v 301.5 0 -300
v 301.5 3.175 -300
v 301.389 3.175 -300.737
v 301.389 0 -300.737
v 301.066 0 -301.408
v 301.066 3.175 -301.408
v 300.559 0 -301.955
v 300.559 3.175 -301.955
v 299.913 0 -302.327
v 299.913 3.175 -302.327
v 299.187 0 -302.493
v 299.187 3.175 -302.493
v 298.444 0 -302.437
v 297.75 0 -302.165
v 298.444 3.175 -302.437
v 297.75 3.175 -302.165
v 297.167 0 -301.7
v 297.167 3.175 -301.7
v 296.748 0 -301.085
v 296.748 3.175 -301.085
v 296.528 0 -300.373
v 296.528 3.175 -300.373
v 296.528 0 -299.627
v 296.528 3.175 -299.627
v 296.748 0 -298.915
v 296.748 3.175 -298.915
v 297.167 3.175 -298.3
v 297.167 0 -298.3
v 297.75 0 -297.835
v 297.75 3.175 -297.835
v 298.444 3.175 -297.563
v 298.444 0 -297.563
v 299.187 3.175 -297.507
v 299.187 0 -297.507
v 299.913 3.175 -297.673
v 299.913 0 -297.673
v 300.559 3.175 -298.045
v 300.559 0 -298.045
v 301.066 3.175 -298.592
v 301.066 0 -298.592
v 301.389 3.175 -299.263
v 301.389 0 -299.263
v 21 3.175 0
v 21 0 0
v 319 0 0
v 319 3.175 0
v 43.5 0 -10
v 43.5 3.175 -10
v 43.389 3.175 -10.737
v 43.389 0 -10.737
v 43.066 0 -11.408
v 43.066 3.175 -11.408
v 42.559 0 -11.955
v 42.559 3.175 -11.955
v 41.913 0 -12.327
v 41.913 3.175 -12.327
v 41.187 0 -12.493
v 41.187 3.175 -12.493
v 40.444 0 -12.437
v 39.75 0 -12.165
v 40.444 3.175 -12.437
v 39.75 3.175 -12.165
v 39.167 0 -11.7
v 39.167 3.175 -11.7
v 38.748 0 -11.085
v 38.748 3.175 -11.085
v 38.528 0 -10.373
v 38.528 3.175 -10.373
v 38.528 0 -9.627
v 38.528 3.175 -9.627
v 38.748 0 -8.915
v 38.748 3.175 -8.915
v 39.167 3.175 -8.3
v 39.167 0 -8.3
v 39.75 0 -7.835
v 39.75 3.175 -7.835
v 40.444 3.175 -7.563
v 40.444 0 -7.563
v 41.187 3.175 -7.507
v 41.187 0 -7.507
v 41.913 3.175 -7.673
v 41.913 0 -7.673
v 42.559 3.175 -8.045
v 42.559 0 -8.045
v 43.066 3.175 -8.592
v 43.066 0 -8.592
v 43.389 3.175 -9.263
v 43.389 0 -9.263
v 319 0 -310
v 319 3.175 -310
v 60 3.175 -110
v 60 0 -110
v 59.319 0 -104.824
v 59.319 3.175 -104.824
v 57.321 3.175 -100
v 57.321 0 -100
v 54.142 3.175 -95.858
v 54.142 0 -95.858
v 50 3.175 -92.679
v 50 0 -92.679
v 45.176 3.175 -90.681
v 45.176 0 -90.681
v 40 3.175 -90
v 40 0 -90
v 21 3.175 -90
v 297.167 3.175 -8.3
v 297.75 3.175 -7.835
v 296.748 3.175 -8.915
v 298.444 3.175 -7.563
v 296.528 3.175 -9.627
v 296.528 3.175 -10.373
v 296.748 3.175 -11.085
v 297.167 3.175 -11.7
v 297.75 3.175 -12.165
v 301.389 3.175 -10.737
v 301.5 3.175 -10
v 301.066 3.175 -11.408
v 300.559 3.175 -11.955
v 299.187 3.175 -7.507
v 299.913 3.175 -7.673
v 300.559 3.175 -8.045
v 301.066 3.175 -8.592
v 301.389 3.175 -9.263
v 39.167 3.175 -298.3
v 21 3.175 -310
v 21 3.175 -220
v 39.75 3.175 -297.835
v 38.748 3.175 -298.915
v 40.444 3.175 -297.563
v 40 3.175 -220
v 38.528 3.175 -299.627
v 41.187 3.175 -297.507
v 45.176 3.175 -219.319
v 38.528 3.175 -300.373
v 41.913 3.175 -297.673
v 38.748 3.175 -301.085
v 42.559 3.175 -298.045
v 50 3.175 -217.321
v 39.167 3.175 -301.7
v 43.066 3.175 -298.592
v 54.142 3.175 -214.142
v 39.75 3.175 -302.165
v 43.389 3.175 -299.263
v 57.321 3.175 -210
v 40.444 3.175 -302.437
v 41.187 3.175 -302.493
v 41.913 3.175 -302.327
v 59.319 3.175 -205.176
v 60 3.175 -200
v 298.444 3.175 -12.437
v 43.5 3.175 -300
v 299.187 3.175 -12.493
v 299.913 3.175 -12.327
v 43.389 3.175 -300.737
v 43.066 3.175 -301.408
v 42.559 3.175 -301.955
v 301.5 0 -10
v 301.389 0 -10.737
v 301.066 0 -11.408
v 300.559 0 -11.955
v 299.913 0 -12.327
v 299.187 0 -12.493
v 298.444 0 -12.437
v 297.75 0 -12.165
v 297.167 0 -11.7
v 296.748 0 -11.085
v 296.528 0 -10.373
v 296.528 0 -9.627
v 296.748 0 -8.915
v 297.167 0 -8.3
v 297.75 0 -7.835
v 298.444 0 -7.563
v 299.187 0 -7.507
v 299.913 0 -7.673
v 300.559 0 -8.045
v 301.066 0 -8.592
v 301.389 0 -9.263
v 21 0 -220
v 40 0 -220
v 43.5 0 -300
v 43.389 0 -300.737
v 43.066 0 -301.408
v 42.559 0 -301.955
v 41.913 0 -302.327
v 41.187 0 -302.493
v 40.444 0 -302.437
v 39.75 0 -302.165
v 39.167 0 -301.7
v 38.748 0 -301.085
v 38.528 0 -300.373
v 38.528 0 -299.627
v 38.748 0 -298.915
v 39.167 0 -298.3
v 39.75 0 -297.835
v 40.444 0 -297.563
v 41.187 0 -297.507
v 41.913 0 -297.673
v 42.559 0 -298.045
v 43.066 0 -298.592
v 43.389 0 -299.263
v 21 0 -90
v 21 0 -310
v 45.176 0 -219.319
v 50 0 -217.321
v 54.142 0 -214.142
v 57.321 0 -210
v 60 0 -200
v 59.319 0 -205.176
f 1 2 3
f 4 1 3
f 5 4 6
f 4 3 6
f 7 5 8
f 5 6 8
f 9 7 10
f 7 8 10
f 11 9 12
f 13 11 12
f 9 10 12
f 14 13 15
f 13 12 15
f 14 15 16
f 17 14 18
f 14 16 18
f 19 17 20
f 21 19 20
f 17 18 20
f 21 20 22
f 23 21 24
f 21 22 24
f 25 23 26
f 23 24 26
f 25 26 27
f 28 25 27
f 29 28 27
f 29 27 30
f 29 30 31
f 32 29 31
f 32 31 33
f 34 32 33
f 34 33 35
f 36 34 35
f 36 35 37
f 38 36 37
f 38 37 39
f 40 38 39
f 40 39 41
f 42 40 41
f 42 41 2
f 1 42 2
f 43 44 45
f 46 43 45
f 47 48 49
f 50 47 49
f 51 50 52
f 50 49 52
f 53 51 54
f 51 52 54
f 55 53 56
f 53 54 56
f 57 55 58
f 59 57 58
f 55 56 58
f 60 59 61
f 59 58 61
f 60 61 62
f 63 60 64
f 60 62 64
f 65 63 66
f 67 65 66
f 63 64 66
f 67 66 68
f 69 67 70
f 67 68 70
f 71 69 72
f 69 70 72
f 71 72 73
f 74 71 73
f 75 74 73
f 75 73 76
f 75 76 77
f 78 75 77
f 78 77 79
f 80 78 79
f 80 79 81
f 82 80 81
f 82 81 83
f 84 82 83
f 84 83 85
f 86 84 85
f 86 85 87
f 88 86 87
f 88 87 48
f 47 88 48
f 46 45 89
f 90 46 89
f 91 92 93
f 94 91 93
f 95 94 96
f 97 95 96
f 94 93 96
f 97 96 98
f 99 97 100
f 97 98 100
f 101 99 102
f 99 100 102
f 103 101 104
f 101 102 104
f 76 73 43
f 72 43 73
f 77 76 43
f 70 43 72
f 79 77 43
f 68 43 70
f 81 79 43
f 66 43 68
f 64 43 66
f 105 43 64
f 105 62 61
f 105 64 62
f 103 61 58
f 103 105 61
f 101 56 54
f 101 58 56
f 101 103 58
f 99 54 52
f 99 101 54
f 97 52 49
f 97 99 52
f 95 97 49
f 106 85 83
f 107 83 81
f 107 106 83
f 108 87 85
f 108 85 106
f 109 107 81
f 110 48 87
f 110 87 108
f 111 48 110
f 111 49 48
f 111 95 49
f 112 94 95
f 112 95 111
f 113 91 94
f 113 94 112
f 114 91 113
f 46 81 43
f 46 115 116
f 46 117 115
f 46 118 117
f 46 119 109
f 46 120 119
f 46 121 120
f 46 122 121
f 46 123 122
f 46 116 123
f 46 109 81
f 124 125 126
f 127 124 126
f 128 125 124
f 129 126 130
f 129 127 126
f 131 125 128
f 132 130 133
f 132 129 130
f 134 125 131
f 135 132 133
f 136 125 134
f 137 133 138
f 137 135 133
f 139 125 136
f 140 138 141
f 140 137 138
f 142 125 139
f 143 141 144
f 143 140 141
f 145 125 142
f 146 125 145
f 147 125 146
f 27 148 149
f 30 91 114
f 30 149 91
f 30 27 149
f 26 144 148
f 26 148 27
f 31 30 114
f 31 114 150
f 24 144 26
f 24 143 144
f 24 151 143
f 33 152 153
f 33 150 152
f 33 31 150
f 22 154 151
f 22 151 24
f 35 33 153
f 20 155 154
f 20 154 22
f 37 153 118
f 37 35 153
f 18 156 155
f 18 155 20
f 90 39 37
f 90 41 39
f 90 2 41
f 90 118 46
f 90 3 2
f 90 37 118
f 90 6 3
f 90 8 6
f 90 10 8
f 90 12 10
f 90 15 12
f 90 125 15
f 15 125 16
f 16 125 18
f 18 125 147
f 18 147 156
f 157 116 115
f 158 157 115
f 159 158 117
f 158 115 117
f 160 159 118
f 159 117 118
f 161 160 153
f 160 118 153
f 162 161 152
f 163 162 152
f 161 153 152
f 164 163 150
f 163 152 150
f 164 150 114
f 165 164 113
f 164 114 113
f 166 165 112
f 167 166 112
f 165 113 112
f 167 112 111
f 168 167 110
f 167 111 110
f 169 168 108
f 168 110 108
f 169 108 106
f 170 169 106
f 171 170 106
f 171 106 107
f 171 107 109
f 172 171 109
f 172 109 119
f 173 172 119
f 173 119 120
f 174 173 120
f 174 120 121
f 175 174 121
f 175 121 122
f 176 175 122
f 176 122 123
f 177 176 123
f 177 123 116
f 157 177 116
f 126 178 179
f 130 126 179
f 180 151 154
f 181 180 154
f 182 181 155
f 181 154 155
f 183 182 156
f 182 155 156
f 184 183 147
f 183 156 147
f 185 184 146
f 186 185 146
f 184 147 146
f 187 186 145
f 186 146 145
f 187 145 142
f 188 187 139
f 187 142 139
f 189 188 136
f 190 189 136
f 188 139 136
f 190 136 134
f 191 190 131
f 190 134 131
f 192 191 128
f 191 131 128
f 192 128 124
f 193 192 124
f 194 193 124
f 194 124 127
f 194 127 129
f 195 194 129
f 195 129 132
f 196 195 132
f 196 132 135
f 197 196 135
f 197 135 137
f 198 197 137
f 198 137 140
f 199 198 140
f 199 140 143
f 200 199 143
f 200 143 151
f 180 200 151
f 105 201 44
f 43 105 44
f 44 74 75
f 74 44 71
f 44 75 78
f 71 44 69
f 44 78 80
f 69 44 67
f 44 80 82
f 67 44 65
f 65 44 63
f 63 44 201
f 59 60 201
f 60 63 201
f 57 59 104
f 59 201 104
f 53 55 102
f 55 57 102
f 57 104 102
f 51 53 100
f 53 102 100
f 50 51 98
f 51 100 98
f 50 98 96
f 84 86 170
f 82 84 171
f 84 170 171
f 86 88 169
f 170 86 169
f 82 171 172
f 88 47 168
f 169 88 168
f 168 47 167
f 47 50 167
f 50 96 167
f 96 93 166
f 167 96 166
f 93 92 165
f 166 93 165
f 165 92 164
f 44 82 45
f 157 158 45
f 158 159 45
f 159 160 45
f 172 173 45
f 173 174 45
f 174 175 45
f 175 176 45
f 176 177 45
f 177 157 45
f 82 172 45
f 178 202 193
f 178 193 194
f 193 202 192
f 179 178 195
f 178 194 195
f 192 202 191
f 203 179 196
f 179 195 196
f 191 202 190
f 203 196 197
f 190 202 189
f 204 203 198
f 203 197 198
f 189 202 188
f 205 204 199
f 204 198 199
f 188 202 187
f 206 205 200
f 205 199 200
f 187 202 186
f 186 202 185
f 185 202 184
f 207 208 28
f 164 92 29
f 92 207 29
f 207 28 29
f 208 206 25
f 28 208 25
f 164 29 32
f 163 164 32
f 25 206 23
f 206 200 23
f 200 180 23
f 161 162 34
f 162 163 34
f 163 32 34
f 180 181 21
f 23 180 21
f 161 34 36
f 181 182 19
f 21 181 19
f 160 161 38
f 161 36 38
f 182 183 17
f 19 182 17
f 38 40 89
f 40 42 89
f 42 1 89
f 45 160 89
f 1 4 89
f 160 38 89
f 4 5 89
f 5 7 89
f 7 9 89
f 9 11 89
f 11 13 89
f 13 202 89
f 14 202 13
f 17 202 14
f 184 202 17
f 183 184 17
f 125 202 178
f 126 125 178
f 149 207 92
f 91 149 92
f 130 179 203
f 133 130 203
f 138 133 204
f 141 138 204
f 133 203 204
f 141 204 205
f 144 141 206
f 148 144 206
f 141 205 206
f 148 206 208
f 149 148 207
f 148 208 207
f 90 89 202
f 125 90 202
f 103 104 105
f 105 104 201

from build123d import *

# Parameters (mm, degrees)
BOSS_EXTRUDE1_DEPTH = 3.175
SKETCH3_R           = 2.5
CUT_EXTRUDE1_DEPTH  = 10


with BuildPart() as part:
    # Sketch2 → Boss-Extrude1 (new body)
    with BuildSketch(Plane(origin=(0, 0, 0), x_dir=(1, 0, 0), z_dir=(0, 1, 0))):
        with BuildLine():
            Line((21, 310), (21, 289))
            Line((21, 289), (21, 220))
            Line((21, 220), (40, 220))
            ThreePointArc((40, 220), (54.142135624, 214.142135624), (60, 200))
            Line((60, 200), (60, 110))
            ThreePointArc((60, 110), (54.142135624, 95.857864376), (40, 90))
            Line((40, 90), (21, 90))
            Line((21, 90), (21, 21))
            Line((21, 21), (21, 0))
            Line((21, 0), (319, 0))
            Line((319, 0), (319, 21))
            Line((319, 21), (319, 289))
            Line((319, 289), (319, 310))
            Line((319, 310), (21, 310))
        make_face()
    extrude(amount=BOSS_EXTRUDE1_DEPTH)

    # Sketch3 → Cut-Extrude1 (cut)
    with BuildSketch(Plane(origin=(0, 3.175, 0), x_dir=(1, 0, 0), z_dir=(0, 1, 0))):
        with Locations((41, 300)):
            Circle(SKETCH3_R)
        with Locations((10, 269)):
            Circle(SKETCH3_R)
        with Locations((299, 300)):
            Circle(SKETCH3_R)
        with Locations((330, 269)):
            Circle(SKETCH3_R)
        with Locations((330, 41)):
            Circle(SKETCH3_R)
        with Locations((299, 10)):
            Circle(SKETCH3_R)
        with Locations((41, 10)):
            Circle(SKETCH3_R)
        with Locations((10, 41)):
            Circle(SKETCH3_R)
    extrude(amount=-CUT_EXTRUDE1_DEPTH, mode=Mode.SUBTRACT)


solid = part.part
